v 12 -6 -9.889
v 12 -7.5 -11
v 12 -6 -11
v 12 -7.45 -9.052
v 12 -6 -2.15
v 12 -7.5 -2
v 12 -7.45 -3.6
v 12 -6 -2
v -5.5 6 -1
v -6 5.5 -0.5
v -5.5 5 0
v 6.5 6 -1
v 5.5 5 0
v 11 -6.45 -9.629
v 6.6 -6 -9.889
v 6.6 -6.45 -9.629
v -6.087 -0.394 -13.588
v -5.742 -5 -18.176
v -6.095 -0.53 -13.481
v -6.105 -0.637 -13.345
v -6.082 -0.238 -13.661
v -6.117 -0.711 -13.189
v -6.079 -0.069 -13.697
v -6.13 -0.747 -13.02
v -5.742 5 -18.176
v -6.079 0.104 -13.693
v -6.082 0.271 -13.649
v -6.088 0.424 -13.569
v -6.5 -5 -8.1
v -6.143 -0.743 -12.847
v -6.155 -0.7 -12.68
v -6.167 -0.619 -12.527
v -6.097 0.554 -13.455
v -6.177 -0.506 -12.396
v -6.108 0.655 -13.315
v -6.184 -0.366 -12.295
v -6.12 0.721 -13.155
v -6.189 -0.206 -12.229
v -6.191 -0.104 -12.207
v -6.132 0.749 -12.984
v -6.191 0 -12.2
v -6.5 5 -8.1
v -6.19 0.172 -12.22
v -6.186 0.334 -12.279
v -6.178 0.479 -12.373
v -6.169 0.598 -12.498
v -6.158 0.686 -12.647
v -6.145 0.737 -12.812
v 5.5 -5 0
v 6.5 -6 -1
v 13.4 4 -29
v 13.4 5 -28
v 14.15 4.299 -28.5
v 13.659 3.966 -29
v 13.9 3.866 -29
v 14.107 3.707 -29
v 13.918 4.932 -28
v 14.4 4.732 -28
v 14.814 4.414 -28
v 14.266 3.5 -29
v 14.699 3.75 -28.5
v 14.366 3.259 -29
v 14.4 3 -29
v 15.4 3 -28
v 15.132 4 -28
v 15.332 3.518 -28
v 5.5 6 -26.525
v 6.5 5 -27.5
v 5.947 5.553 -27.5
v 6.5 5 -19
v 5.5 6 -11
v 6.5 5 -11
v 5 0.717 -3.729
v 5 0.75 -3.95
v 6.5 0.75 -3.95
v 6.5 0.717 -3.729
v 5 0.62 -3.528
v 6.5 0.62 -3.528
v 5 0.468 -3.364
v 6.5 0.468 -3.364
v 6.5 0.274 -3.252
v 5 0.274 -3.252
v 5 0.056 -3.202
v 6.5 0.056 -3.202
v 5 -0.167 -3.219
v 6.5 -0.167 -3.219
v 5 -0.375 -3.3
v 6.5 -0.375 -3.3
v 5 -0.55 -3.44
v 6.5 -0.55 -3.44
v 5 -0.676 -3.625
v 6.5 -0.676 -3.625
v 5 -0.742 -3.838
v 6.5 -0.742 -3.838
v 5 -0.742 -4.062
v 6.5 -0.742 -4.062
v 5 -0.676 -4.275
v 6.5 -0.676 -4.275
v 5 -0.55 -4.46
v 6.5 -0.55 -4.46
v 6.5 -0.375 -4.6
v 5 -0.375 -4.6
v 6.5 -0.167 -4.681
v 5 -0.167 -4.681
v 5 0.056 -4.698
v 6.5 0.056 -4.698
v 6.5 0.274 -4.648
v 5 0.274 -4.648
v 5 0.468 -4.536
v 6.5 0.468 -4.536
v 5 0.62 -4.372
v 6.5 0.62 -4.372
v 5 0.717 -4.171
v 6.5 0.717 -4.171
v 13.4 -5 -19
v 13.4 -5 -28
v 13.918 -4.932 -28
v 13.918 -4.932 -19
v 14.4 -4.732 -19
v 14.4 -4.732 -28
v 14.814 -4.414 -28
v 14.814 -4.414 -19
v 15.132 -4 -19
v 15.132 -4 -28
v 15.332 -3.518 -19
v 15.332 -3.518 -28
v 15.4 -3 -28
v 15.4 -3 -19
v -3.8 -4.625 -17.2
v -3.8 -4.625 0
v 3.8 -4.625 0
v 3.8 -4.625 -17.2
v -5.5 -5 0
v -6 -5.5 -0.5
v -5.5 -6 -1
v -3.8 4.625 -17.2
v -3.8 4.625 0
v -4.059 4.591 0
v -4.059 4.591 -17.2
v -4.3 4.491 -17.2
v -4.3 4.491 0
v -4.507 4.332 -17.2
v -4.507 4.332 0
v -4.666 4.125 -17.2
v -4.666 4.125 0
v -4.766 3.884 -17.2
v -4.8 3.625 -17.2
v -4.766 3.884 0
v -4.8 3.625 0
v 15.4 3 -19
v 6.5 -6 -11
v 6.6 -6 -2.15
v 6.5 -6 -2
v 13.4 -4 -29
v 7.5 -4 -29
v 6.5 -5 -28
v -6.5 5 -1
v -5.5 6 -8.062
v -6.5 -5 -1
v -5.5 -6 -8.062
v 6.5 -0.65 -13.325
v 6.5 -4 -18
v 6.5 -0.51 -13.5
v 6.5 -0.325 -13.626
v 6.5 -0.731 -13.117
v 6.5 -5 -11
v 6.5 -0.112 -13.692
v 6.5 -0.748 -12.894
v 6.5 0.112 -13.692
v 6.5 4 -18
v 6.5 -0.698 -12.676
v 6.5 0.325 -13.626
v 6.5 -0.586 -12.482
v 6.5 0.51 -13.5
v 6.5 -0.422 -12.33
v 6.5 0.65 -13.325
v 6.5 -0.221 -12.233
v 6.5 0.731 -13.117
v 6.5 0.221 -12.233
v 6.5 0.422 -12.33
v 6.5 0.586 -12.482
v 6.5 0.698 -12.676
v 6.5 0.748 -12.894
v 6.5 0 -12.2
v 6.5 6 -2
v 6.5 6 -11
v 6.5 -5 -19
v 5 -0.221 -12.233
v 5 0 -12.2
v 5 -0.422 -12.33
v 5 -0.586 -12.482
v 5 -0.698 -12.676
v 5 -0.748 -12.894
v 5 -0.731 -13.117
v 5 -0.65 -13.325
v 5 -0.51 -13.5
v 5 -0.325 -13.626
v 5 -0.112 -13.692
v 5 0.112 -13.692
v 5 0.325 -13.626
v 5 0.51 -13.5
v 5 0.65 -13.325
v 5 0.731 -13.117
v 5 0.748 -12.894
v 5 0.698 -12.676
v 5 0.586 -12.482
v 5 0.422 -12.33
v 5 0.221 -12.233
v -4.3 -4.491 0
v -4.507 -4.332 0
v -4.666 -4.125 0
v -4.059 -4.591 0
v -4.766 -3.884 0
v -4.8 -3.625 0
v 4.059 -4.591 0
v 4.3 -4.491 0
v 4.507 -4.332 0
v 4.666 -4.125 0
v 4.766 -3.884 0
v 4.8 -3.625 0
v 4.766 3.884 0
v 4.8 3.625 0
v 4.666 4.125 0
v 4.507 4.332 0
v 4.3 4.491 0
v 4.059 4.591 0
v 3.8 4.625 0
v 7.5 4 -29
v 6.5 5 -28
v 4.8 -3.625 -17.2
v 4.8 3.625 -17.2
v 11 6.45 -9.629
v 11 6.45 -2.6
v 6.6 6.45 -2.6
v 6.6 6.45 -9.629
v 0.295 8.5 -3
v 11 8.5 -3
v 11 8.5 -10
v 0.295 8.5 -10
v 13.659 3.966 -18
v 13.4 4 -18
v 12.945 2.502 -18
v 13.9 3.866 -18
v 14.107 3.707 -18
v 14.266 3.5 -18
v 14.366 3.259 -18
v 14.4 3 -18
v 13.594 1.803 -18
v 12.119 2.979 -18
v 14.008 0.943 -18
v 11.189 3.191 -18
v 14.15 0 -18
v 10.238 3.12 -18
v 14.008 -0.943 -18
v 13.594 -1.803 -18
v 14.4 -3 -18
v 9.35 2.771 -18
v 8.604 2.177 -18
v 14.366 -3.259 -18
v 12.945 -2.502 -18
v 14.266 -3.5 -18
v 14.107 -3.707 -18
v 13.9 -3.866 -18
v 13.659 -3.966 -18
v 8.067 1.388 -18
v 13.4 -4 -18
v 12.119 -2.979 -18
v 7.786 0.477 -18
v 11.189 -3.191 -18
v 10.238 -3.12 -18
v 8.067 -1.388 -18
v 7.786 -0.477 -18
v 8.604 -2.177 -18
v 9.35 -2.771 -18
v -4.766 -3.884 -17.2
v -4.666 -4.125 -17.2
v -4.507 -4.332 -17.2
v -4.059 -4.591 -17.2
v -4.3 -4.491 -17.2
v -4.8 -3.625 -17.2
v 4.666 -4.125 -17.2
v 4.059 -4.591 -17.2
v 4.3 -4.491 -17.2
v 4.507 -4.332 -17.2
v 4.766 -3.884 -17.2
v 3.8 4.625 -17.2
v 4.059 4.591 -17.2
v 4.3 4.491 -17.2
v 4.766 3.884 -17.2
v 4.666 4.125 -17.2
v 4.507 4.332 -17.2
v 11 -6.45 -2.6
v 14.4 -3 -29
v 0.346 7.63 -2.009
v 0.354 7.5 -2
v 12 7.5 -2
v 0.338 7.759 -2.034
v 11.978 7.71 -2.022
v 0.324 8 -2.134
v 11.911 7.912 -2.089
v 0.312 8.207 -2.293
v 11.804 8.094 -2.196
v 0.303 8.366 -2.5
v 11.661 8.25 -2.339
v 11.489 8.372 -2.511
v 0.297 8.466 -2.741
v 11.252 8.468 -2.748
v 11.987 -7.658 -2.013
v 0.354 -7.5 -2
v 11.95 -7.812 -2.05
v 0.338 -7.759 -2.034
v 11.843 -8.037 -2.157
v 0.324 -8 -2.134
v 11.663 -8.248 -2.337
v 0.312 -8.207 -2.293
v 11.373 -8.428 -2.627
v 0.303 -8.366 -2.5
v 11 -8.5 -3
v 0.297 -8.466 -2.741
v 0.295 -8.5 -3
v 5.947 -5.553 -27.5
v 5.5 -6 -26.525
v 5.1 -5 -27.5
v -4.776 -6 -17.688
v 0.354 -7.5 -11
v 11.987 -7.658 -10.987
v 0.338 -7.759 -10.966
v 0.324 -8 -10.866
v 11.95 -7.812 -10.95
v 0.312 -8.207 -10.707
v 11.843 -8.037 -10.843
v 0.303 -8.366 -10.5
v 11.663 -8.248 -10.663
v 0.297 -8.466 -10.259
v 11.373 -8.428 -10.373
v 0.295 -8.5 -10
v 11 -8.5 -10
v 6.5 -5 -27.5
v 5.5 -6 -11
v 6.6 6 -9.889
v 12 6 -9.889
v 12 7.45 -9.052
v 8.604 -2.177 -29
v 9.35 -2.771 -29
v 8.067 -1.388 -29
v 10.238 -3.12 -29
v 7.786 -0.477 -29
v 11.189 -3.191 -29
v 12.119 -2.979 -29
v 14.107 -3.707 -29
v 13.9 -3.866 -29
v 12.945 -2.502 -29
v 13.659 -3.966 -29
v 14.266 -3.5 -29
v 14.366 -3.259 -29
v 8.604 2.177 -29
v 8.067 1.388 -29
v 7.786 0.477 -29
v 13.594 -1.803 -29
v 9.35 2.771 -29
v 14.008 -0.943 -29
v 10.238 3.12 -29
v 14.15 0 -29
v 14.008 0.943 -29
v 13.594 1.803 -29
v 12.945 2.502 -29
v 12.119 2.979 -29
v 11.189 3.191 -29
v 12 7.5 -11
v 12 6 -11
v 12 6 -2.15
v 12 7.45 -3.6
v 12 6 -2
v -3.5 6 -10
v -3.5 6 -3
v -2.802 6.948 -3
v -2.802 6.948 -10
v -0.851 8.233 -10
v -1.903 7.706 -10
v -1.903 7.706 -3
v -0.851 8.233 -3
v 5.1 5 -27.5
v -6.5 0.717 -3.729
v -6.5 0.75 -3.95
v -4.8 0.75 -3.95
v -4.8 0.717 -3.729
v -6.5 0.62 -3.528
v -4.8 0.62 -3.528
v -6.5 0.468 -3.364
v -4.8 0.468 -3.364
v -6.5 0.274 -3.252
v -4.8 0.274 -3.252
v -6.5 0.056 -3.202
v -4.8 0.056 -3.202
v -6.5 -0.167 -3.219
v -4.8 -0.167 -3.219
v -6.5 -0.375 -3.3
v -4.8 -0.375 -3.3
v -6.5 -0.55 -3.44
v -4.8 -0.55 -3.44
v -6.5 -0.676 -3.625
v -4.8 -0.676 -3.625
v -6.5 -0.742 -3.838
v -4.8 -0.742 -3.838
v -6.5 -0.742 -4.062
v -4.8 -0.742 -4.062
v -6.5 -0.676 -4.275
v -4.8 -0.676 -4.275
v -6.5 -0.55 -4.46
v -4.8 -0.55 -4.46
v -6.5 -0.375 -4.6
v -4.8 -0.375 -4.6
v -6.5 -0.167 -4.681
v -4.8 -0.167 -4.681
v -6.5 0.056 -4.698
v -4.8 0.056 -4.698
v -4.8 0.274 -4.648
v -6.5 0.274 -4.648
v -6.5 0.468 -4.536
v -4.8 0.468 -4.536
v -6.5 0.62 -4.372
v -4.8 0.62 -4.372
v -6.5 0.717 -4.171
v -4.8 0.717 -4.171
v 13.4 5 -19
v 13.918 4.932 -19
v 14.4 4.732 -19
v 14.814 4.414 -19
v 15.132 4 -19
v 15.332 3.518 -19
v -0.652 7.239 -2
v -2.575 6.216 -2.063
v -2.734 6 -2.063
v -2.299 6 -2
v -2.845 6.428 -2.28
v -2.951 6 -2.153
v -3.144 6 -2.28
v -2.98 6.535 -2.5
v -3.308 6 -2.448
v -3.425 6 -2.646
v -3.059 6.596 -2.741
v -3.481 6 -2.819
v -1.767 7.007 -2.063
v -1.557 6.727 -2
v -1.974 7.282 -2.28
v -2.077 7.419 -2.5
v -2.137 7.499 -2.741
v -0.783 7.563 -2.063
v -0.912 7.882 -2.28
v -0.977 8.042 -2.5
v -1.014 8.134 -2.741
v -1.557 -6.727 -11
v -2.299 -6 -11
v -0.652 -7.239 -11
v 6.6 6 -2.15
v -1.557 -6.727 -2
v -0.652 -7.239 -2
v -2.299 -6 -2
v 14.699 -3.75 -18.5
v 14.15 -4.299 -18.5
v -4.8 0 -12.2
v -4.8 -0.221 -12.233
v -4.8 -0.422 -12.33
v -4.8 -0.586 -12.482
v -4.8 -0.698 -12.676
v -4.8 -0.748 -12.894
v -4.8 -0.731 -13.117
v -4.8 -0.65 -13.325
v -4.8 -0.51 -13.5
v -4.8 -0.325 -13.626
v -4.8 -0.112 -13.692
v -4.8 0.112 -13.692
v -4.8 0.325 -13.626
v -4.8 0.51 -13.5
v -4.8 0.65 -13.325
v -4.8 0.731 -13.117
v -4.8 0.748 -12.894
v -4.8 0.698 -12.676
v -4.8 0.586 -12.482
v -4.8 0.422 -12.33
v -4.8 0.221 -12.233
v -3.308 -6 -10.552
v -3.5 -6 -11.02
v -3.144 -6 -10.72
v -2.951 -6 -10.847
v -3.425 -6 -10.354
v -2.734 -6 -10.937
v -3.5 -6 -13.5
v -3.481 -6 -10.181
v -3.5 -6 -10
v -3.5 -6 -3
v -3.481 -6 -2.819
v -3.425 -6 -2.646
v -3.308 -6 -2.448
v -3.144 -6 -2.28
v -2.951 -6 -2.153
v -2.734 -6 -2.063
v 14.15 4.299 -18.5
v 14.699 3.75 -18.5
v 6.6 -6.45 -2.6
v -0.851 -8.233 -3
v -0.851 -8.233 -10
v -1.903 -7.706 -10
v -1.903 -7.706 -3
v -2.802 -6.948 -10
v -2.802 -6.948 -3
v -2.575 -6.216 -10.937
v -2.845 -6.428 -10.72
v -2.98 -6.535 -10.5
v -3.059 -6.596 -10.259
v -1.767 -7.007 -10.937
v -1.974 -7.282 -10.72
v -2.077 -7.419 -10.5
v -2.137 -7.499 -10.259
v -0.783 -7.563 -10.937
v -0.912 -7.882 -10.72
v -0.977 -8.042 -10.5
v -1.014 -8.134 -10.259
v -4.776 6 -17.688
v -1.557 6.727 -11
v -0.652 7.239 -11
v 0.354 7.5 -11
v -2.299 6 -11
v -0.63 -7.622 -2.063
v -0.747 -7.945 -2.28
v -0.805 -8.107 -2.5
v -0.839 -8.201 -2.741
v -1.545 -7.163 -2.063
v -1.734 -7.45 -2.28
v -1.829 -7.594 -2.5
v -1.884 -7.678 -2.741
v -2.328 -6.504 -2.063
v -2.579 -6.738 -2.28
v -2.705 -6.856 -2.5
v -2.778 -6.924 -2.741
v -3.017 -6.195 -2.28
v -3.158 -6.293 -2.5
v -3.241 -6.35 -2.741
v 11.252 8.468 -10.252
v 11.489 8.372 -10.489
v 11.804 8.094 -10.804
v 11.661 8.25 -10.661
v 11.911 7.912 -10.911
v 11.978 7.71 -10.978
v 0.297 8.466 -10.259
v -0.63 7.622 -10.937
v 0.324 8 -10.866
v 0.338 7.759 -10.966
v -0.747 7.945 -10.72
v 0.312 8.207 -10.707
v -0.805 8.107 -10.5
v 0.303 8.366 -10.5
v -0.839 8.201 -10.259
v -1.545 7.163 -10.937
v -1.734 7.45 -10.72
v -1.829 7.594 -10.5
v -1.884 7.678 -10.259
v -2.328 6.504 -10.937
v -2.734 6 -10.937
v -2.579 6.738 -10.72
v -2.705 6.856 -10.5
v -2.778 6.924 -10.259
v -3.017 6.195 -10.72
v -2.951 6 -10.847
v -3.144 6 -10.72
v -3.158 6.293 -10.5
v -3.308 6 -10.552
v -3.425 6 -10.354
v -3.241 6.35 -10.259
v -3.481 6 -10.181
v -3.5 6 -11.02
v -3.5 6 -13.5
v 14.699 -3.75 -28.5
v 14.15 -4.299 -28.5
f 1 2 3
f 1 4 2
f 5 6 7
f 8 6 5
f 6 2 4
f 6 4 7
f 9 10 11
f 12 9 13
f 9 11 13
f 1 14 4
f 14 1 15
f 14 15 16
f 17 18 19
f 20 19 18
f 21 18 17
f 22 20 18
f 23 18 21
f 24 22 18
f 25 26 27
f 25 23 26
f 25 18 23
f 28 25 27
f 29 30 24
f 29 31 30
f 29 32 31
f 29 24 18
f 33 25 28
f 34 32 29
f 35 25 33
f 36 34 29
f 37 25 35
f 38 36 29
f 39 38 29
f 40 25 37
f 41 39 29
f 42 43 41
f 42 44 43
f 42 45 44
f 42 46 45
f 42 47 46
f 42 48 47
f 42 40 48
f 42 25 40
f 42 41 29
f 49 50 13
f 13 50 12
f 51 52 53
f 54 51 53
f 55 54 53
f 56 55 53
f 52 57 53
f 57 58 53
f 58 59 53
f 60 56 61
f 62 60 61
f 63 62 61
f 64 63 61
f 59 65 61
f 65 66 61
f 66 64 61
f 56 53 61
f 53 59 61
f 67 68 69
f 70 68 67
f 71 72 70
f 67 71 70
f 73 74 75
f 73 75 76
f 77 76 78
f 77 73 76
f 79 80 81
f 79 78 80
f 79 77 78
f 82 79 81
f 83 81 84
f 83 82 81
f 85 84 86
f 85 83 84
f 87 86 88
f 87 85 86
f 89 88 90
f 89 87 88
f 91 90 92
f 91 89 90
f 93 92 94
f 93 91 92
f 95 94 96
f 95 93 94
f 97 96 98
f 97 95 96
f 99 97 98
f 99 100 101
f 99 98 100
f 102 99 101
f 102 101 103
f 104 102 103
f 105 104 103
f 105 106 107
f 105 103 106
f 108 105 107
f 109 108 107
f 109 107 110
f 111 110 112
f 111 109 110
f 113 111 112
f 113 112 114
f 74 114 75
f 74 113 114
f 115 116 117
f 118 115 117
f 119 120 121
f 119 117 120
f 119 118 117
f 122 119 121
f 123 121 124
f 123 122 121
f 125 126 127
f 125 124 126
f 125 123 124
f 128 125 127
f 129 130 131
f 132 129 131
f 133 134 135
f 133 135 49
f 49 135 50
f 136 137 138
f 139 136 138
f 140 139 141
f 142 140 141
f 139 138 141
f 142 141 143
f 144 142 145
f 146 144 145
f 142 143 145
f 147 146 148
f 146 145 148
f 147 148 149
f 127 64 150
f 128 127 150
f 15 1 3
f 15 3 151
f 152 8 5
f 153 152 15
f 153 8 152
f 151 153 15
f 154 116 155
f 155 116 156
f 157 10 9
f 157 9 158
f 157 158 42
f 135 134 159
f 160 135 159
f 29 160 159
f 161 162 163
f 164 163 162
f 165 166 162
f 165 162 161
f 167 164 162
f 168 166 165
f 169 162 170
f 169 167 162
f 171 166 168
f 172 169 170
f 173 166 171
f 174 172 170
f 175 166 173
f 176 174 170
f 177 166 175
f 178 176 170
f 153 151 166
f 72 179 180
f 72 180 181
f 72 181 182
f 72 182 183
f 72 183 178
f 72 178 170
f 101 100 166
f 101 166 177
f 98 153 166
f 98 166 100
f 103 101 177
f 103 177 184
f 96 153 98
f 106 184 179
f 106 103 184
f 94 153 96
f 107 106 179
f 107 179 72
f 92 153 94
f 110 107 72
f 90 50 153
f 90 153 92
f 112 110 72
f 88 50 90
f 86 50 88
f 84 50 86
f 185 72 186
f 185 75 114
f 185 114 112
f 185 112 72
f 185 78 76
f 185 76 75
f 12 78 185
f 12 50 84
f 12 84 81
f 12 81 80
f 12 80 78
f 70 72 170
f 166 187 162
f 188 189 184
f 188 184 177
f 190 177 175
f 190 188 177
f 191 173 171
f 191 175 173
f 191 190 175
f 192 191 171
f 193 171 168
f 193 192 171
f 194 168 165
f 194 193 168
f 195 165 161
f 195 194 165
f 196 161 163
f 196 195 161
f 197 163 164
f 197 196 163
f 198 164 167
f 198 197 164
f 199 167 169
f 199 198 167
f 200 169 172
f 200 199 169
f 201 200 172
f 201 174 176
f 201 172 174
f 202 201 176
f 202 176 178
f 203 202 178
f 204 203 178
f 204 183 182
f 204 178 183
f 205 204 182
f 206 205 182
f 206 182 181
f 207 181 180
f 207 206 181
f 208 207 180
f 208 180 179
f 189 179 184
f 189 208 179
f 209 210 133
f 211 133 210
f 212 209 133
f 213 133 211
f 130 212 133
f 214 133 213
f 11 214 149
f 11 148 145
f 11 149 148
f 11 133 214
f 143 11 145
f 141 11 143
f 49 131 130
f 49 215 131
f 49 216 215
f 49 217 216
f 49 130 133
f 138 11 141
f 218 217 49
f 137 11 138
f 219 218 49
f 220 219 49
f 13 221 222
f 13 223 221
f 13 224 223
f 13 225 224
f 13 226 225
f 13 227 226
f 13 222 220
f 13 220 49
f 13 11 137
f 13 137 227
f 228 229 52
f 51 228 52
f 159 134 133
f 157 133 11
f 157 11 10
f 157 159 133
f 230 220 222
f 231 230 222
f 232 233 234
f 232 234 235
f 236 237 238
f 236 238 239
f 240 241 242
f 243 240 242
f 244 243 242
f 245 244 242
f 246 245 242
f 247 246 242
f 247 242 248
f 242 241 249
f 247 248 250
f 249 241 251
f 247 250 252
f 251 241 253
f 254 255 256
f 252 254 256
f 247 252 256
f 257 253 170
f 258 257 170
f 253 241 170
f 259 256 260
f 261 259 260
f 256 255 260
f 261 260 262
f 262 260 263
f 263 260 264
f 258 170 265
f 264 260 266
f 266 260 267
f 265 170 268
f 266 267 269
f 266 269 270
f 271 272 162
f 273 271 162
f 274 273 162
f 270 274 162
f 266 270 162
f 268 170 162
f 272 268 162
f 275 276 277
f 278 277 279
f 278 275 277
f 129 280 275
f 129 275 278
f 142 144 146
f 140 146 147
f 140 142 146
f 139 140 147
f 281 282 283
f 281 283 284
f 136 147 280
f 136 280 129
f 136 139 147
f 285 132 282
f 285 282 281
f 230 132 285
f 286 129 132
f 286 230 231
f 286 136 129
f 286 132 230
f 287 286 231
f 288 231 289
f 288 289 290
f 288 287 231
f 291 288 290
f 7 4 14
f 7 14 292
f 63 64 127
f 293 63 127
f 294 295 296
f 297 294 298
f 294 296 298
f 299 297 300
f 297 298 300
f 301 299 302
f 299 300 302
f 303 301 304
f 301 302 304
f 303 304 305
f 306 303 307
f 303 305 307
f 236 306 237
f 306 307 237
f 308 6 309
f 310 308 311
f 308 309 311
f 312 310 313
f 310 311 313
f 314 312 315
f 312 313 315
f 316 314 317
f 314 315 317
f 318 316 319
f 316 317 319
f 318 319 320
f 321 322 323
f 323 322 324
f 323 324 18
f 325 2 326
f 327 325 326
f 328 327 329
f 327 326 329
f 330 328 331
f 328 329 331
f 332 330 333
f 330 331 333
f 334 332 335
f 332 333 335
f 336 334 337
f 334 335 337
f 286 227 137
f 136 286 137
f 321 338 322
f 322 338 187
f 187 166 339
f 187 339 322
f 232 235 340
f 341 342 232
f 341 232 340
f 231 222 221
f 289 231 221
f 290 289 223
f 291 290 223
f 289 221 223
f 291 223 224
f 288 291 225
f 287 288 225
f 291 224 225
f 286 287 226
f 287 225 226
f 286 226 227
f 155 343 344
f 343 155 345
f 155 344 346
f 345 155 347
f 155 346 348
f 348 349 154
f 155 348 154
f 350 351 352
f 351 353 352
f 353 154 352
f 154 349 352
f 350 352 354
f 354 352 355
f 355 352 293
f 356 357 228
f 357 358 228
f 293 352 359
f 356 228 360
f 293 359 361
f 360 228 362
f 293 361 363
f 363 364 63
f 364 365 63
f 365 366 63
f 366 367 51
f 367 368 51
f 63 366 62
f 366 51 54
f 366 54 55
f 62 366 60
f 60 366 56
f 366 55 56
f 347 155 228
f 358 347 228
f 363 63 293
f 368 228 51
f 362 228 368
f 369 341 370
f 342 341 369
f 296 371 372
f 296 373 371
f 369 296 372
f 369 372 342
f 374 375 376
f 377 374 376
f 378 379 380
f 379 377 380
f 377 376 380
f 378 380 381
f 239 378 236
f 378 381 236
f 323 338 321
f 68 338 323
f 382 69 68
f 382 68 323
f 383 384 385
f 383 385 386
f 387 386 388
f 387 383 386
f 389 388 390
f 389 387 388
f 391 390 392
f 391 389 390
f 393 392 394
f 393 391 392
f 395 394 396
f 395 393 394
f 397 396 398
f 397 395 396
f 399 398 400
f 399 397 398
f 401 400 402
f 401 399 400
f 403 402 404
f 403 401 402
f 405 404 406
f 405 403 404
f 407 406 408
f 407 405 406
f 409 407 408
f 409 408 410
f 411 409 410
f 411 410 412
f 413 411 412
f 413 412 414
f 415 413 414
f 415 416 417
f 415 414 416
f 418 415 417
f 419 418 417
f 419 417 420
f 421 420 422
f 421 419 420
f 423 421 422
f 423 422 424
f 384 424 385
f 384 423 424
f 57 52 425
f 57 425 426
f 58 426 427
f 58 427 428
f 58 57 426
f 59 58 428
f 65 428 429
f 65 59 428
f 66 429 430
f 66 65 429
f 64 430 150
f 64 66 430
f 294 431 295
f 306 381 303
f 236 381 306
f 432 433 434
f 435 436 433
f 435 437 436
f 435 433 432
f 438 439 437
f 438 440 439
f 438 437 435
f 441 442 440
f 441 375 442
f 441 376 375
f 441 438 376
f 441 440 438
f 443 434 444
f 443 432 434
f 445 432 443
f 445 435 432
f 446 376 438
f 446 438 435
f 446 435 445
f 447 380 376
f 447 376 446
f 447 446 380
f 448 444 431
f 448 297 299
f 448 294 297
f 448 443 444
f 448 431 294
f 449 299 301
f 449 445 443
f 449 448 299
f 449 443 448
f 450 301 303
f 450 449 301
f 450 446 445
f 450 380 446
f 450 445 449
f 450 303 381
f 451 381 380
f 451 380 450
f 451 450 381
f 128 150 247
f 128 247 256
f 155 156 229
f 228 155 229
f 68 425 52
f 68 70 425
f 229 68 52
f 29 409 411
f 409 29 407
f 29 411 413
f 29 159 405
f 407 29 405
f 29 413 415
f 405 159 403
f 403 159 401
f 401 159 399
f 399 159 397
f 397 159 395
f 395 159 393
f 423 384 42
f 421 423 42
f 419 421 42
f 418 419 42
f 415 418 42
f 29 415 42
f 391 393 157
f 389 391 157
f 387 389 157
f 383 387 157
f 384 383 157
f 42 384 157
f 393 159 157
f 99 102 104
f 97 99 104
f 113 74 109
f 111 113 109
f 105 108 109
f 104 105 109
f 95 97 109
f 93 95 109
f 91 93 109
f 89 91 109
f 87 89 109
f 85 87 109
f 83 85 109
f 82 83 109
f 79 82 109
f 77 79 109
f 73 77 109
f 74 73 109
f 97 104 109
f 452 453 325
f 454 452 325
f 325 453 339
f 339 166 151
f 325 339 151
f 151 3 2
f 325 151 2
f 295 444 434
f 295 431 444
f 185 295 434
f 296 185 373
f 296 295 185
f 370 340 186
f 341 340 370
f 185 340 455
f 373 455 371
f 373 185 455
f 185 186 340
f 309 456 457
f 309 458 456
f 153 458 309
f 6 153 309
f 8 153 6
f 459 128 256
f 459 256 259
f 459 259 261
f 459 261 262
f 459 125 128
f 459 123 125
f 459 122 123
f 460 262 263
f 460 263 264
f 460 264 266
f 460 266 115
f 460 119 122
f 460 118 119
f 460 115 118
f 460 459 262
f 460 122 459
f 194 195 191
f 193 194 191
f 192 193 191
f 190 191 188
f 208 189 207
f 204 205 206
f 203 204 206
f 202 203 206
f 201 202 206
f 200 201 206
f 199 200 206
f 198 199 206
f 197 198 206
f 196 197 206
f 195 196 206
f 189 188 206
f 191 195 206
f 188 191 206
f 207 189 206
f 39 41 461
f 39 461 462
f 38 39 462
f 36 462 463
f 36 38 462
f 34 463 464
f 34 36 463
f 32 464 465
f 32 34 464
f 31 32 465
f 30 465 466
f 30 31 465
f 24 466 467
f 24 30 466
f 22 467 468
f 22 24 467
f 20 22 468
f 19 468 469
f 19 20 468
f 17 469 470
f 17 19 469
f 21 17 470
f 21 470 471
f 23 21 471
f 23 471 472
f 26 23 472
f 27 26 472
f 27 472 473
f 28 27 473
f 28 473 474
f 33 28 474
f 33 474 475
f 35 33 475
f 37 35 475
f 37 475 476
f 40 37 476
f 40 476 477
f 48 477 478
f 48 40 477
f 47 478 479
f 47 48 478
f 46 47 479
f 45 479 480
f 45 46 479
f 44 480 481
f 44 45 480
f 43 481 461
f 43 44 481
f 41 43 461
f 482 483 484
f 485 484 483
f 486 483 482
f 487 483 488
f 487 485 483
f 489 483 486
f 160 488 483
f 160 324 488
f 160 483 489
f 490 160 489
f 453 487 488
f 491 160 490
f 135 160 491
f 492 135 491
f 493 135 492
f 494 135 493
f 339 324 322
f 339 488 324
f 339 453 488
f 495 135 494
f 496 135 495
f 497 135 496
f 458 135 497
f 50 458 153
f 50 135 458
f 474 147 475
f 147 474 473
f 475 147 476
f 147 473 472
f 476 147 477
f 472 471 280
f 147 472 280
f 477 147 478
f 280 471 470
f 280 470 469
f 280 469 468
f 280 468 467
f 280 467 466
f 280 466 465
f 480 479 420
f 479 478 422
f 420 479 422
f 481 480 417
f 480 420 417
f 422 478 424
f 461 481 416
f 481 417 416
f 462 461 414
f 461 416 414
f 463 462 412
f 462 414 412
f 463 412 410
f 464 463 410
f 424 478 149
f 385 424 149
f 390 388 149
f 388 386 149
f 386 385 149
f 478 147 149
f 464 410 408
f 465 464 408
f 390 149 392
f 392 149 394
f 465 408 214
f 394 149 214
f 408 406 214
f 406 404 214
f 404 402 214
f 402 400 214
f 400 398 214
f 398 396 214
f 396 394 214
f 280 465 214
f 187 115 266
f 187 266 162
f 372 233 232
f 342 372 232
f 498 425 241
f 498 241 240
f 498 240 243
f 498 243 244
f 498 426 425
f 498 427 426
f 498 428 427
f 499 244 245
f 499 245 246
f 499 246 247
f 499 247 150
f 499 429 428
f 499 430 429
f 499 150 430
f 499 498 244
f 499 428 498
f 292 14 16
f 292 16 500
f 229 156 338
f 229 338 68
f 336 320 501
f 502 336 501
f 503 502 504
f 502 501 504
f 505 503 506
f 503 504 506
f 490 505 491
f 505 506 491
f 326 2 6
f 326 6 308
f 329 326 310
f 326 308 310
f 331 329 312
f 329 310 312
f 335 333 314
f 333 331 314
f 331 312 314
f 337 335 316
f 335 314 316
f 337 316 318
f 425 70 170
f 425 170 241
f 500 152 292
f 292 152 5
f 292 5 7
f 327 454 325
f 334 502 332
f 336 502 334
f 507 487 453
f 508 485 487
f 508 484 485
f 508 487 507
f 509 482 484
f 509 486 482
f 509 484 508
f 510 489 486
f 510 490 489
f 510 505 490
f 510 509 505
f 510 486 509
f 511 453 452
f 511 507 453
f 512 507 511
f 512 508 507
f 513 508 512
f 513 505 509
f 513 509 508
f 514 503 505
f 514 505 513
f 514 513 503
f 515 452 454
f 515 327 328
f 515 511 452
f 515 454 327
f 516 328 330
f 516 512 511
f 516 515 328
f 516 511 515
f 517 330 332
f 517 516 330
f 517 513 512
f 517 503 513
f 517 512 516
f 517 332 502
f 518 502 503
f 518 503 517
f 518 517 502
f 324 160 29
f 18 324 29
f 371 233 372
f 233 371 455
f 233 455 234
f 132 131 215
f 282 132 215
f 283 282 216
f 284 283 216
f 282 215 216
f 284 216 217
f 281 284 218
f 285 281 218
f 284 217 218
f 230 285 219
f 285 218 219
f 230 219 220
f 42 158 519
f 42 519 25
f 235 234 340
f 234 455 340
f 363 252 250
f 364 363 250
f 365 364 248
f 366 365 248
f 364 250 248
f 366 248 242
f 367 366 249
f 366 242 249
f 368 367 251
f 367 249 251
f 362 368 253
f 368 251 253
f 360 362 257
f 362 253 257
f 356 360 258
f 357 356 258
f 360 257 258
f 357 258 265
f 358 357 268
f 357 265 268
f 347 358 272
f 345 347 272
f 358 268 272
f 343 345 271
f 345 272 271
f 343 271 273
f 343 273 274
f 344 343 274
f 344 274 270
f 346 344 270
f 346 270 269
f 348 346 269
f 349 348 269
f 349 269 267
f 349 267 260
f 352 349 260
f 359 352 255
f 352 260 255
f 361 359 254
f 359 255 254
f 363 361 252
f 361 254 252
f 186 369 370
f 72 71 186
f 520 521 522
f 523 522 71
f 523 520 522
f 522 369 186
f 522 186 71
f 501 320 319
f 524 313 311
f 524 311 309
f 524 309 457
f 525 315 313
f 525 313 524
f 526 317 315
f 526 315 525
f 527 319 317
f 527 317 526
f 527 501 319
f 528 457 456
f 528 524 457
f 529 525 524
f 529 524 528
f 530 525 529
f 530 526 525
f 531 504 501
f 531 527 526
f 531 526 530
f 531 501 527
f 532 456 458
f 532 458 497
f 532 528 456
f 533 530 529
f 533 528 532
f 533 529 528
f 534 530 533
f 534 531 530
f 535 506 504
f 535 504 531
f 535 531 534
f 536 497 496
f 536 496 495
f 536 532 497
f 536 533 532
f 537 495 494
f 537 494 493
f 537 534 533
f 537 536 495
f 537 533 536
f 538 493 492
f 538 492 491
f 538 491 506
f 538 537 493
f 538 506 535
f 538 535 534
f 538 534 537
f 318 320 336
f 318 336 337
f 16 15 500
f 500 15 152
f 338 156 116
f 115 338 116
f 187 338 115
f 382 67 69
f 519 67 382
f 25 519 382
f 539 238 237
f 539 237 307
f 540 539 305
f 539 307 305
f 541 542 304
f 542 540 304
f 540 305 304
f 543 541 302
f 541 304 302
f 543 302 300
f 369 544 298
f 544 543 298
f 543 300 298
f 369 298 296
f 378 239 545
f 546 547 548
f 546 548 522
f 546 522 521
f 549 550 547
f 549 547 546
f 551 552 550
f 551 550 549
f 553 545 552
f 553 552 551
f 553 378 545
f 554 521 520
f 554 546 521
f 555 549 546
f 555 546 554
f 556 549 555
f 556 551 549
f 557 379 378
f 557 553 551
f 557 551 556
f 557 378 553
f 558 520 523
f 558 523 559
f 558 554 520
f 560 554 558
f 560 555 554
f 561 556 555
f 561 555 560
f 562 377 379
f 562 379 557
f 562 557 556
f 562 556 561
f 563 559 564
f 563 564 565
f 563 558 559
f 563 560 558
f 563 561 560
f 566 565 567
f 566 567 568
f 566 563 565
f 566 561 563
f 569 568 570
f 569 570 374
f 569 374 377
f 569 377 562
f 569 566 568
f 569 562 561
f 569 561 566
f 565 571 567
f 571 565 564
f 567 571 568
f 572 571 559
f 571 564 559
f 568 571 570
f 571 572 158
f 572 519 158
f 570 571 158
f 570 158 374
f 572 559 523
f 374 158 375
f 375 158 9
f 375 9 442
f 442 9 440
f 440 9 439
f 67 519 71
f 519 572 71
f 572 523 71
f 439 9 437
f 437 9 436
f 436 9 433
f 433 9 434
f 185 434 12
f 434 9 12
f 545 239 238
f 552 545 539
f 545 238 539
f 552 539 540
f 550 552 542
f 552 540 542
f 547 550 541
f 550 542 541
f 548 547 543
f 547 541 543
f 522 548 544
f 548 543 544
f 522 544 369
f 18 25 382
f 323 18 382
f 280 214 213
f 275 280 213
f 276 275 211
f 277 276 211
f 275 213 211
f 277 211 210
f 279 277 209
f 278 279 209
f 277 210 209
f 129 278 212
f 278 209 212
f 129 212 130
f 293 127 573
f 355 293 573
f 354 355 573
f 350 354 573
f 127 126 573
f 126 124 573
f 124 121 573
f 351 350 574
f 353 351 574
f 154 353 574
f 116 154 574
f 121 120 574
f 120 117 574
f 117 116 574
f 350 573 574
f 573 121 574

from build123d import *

# Parameters (mm, degrees)
SKETCH2_W                = 13
SKETCH2_H                = 12
BOSS_EXTRUDE3_DEPTH      = 29
CUT_EXTRUDE2_DEPTH       = 17.2
SKETCH5_W                = 15.5
SKETCH5_H                = 2.5
CUT_EXTRUDE3_DEPTH       = 2
CHAMFER4_SIZE            = 1
SKETCH6_W                = 15.5
SKETCH6_H                = 18
CUT_EXTRUDE4_DEPTH       = 2.5
SKETCH8_W                = 15.5
SKETCH8_H                = 18
CUT_EXTRUDE5_DEPTH       = 2.5
BOSS_EXTRUDE4_DEPTH      = 8.9
SKETCH10_R               = 3.2
CUT_EXTRUDE6_DEPTH       = 11
SKETCH11_W               = 13
SKETCH11_H               = 12
CUT_EXTRUDE7_DEPTH       = 1.5
FILLET1_R                = 2
CHAMFER5_SIZE            = 1
CUT_EXTRUDE9_DEPTH       = 36.894428537
CHAMFER6_SIZE            = 1
CHAMFER6_SIZE_2          = 9.42392311
CUT_EXTRUDE11_DEPTH      = 11.5
CHAMFER7_SIZE            = 1
FILLET2_R                = 1
CUT_EXTRUDE12_DEPTH      = 33.897568325
CUT_EXTRUDE12_DEPTH_BACK = 33.897568325
SKETCH17_R               = 0.75
BOSS_EXTRUDE5_START      = -0.2
SKETCH18_R               = 0.795097265
SKETCH18_R_2             = 0.75
BOSS_EXTRUDE5_DEPTH      = 0.2
SKETCH19_W               = 5.4
SKETCH19_H               = 6.7
CUT_EXTRUDE13_DEPTH      = 6.45
CHAMFER8_SIZE            = 0.75
CHAMFER9_SIZE            = 0.288675135
CHAMFER9_SIZE_2          = 0.5
CHAMFER10_SIZE           = 1


with BuildPart() as part:
    # Sketch2 → Boss-Extrude3 (new body)
    with BuildSketch(Plane.XY):
        Polygon((-3.5, 8.5), (-3.5, 6), (6.5, 6), (12, 6), (12, 8.5), align=None)
        Rectangle(SKETCH2_W, SKETCH2_H)
        Polygon((12, -6), (6.5, -6), (-3.5, -6), (-3.5, -8.5), (12, -8.5), align=None)
    extrude(amount=-BOSS_EXTRUDE3_DEPTH)

    # Sketch4 → Cut-Extrude2 (cut)
    with BuildSketch(Plane.XY):
        with BuildLine():
            Line((-3.8, -4.625), (3.8, -4.625))
            ThreePointArc((3.8, -4.625), (4.507106781, -4.332106781), (4.8, -3.625))
            Line((4.8, -3.625), (4.8, 3.625))
            ThreePointArc((4.8, 3.625), (4.507106781, 4.332106781), (3.8, 4.625))
            Line((3.8, 4.625), (-3.8, 4.625))
            ThreePointArc((-3.8, 4.625), (-4.507106781, 4.332106781), (-4.8, 3.625))
            Line((-4.8, 3.625), (-4.8, -3.625))
            ThreePointArc((-4.8, -3.625), (-4.507106781, -4.332106781), (-3.8, -4.625))
        make_face()
    extrude(amount=-CUT_EXTRUDE2_DEPTH, mode=Mode.SUBTRACT)

    # Sketch5 → Cut-Extrude3 (cut)
    with BuildSketch(Plane.XY):
        with Locations((4.25, 7.25)):
            Rectangle(SKETCH5_W, SKETCH5_H)
        with Locations((4.25, -7.25)):
            Rectangle(SKETCH5_W, SKETCH5_H)
    extrude(amount=-CUT_EXTRUDE3_DEPTH, mode=Mode.SUBTRACT)

    # Chamfer4
    chamfer4_edges = [part.edges().sort_by_distance(p)[0] for p in [
        (6.5, 0, 0),
        (0, -6, 0),
        (-6.5, 0, 0),
        (0, 6, 0),
    ]]
    chamfer(chamfer4_edges, length=CHAMFER4_SIZE)

    # Sketch6 → Cut-Extrude4 (cut)
    with BuildSketch(Plane(origin=(0, 8.5, 0), x_dir=(1, 0, 0), z_dir=(0, 1, 0))):
        with Locations((4.25, 20)):
            Rectangle(SKETCH6_W, SKETCH6_H)
    extrude(amount=-CUT_EXTRUDE4_DEPTH, mode=Mode.SUBTRACT)

    # Sketch8 → Cut-Extrude5 (cut)
    with BuildSketch(Plane.XZ.offset(8.5)):
        with Locations((4.25, -20)):
            Rectangle(SKETCH8_W, SKETCH8_H)
    extrude(amount=-CUT_EXTRUDE5_DEPTH, mode=Mode.SUBTRACT)

    # Sketch9 → Boss-Extrude4 (add)
    with BuildSketch(Plane(origin=(6.5, 0, 0), x_dir=(0, 0, -1), z_dir=(1, 0, 0))):
        Polygon((18, 0), (18, 5), (29, 5), (29, -5), (18, -5), align=None)
    extrude(amount=BOSS_EXTRUDE4_DEPTH)

    # Sketch10 → Cut-Extrude6 (cut)
    with BuildSketch(Plane.XY.offset(-18)):
        with Locations((10.95, 0)):
            Circle(SKETCH10_R)
    extrude(amount=-CUT_EXTRUDE6_DEPTH, mode=Mode.SUBTRACT)

    # Sketch11 → Cut-Extrude7 (cut)
    with BuildSketch(Plane(origin=(0, 0, -29), x_dir=(-1, 0, 0), z_dir=(0, 0, -1))):
        Rectangle(SKETCH11_W, SKETCH11_H)
    extrude(amount=-CUT_EXTRUDE7_DEPTH, mode=Mode.SUBTRACT)

    # Fillet1
    fillet1_edges = [part.edges().sort_by_distance(p)[0] for p in [
        (15.4, -5, -23.5),
        (15.4, 5, -23.5),
    ]]
    fillet(fillet1_edges, radius=FILLET1_R)

    # Chamfer5
    chamfer5_edges = [part.edges().sort_by_distance(p)[0] for p in [
        (6.5, 0, -29),
        (15.4, 0, -18),
        (15.4, 0, -29),
        (9.95, -5, -18),
        (9.95, 5, -18),
        (14.814213562, -4.414213562, -18),
        (14.814213562, 4.414213562, -18),
        (9.95, 5, -29),
        (9.95, -5, -29),
        (14.814213562, -4.414213562, -29),
        (14.814213562, 4.414213562, -29),
    ]]
    chamfer(chamfer5_edges, length=CHAMFER5_SIZE)

    # Sketch14 → Cut-Extrude9 (cut, through all)
    with BuildSketch(Plane(origin=(0, 6, 0), x_dir=(1, 0, 0), z_dir=(0, 1, 0))):
        Polygon((-6.5, 27.5), (-6.5, 17.523527678), (5.1, 27.5), align=None)
    extrude(amount=-CUT_EXTRUDE9_DEPTH, mode=Mode.SUBTRACT)

    # Chamfer6
    # the kernel refuses this chamfer: 9.42392311, 1 mm, written as the material it takes off along each edge
    with BuildSketch(Plane(origin=(-6.5, 30.49964556, -17.523527678), x_dir=(0.6076323251889422, 0, -0.794218456966016), z_dir=(0, -1, 0))) as chamfer6_piece_1:
        Polygon((CHAMFER6_SIZE * 0.978564276214, CHAMFER6_SIZE * 0.205941635709), (-CHAMFER6_SIZE_2 * 0.794218456941, CHAMFER6_SIZE_2 * 0.60763232517), (0, 0), align=None)
    extrude(amount=60.999291121, mode=Mode.SUBTRACT)
    # the kernel refuses this chamfer: 9.42392311, 1 mm, written as the material it takes off along each edge
    with BuildSketch(Plane(origin=(-7.691602788, -6, -16.498700761), x_dir=(0.6518104828071479, -0.027495876610586452, 0.757883283409872), z_dir=(0.7581699346405228, 0, -0.6520570145372148))) as chamfer6_2_piece_1:
        Polygon((CHAMFER6_SIZE * 0.999621916911, -CHAMFER6_SIZE * 0.0274958766106), (-CHAMFER6_SIZE * 0.0274958766106, -CHAMFER6_SIZE * 0.999621916911), (0, 0), align=None)
    extrude(amount=19.443365976, mode=Mode.SUBTRACT)
    with BuildSketch(Plane(origin=(-7.691602788, 6, -16.498700761), x_dir=(0.6518104828071478, 0.02749587661058648, 0.757883283409872), z_dir=(0.7581699346405228, 0, -0.6520570145372148))) as chamfer6_2_piece_2:
        Polygon((CHAMFER6_SIZE * 0.999621916911, CHAMFER6_SIZE * 0.0274958766106), (-CHAMFER6_SIZE * 0.0274958766106, CHAMFER6_SIZE * 0.999621916911), (0, 0), align=None)
    extrude(amount=19.443365976, mode=Mode.SUBTRACT)

    # Sketch16 → Cut-Extrude11 (cut)
    with BuildSketch(Plane.XY.offset(-2)):
        with BuildLine():
            ThreePointArc((-3.5, 6), (-1.902802726, 7.706126426), (0.295303565, 8.5))
            Line((0.295303565, 8.5), (-3.5, 8.5))
            Line((-3.5, 8.5), (-3.5, 6))
        make_face()
        with BuildLine():
            Line((-3.5, -8.5), (0.295303565, -8.5))
            ThreePointArc((0.295303565, -8.5), (-1.902802726, -7.706126426), (-3.5, -6))
            Line((-3.5, -6), (-3.5, -8.5))
        make_face()
    extrude(amount=-CUT_EXTRUDE11_DEPTH, mode=Mode.SUBTRACT)

    # Chamfer7
    # the kernel refuses this chamfer: 1 mm, written as the material it takes off along each edge
    with BuildSketch(Plane(origin=(6.5, -6, -11), x_dir=(0.027495876610586487, 0.9996219169112968, 0), z_dir=(0, 0, -1))) as chamfer7_piece_1:
        Polygon((CHAMFER7_SIZE * 0.999621916911, -CHAMFER7_SIZE * 0.0274958766106), (-CHAMFER7_SIZE * 0.0274958766106, -CHAMFER7_SIZE * 0.999621916911), (0, 0), align=None)
    extrude(amount=18.956774475, mode=Mode.SUBTRACT)
    with BuildSketch(Plane(origin=(-6.5, -6, 1.571682988), x_dir=(0.9996219169112968, -0.027495876610586487, 0), z_dir=(0, 0, -1))) as chamfer7_piece_2:
        Polygon((CHAMFER7_SIZE * 0.999621916911, -CHAMFER7_SIZE * 0.0274958766106), (-CHAMFER7_SIZE * 0.0274958766106, -CHAMFER7_SIZE * 0.999621916911), (0, 0), align=None)
    extrude(amount=12.242970544, mode=Mode.SUBTRACT)
    with BuildSketch(Plane(origin=(-5.654981471, -6, -19.329791256), x_dir=(0.9968040214884636, -0.02749587661058647, 0.07500479660556608), z_dir=(-0.0750331653764868, 0, 0.9971810387756)), Plane(origin=(-6.692961515, 6, -5.535171055), x_dir=(0.9968040214884636, 0.027495876610586487, 0.07500479660556608), z_dir=(0.0750331653764868, 0, -0.9971810387756))) as chamfer7_piece_3:
        Polygon((CHAMFER7_SIZE * 0.999621916911, CHAMFER7_SIZE * 0.0274958766106), (-CHAMFER7_SIZE * 0.0274958766106, CHAMFER7_SIZE * 0.999621916911), (0, 0), align=None)
    extrude(amount=13.833616631, mode=Mode.SUBTRACT)
    with BuildSketch(Plane(origin=(6.5, 6, -11), x_dir=(0.027495876610586487, -0.9996219169112968, 0), z_dir=(0, 0, -1))) as chamfer7_piece_4:
        Polygon((CHAMFER7_SIZE * 0.999621916911, CHAMFER7_SIZE * 0.0274958766106), (-CHAMFER7_SIZE * 0.0274958766106, CHAMFER7_SIZE * 0.999621916911), (0, 0), align=None)
    extrude(amount=18.956774475, mode=Mode.SUBTRACT)
    with BuildSketch(Plane(origin=(-6.5, 6, 1.571682988), x_dir=(0.9996219169112968, 0.027495876610586487, 0), z_dir=(0, 0, -1))) as chamfer7_piece_5:
        Polygon((CHAMFER7_SIZE * 0.999621916911, CHAMFER7_SIZE * 0.0274958766106), (-CHAMFER7_SIZE * 0.0274958766106, CHAMFER7_SIZE * 0.999621916911), (0, 0), align=None)
    extrude(amount=12.242970544, mode=Mode.SUBTRACT)

    # Fillet2
    # the kernel refuses this fillet: 1 mm, written as the material it takes off along each edge
    with BuildSketch(Plane(origin=(12, 8.5, -1), x_dir=(-1, 0, 0), z_dir=(0, 0, -1))) as fillet2_piece_1:
        with BuildLine():
            CenterArc((FILLET2_R, -FILLET2_R), FILLET2_R, 90, 90)
            Line((0, -FILLET2_R), (-FILLET2_R * 0.02, -FILLET2_R))
            Line((-FILLET2_R * 0.02, -FILLET2_R), (-FILLET2_R * 0.02, FILLET2_R * 0.02))
            Line((-FILLET2_R * 0.02, FILLET2_R * 0.02), (FILLET2_R, FILLET2_R * 0.02))
            Line((FILLET2_R, FILLET2_R * 0.02), (FILLET2_R, 0))
        make_face()
    extrude(amount=11, mode=Mode.SUBTRACT)
    with BuildSketch(Plane(origin=(12, -8.5, -1), x_dir=(-1, 0, 0), z_dir=(0, 0, -1))) as fillet2_piece_2:
        with BuildLine():
            CenterArc((FILLET2_R, FILLET2_R), FILLET2_R, 180, 90)
            Line((0, FILLET2_R), (-FILLET2_R * 0.02, FILLET2_R))
            Line((-FILLET2_R * 0.02, FILLET2_R), (-FILLET2_R * 0.02, -FILLET2_R * 0.02))
            Line((-FILLET2_R * 0.02, -FILLET2_R * 0.02), (FILLET2_R, -FILLET2_R * 0.02))
            Line((FILLET2_R, -FILLET2_R * 0.02), (FILLET2_R, 0))
        make_face()
    extrude(amount=11, mode=Mode.SUBTRACT)
    with BuildSketch(Plane(origin=(13, -8.5, -11), x_dir=(0, 1, 0), z_dir=(-1, 0, 0))) as fillet2_piece_3:
        with BuildLine():
            CenterArc((FILLET2_R, -FILLET2_R), FILLET2_R, 90, 90)
            Line((0, -FILLET2_R), (-FILLET2_R * 0.02, -FILLET2_R))
            Line((-FILLET2_R * 0.02, -FILLET2_R), (-FILLET2_R * 0.02, FILLET2_R * 0.02))
            Line((-FILLET2_R * 0.02, FILLET2_R * 0.02), (FILLET2_R, FILLET2_R * 0.02))
            Line((FILLET2_R, FILLET2_R * 0.02), (FILLET2_R, 0))
        make_face()
    extrude(amount=13.704696435, mode=Mode.SUBTRACT)
    with BuildSketch(Plane(origin=(0.847651782, -3.530602507, -11), x_dir=(-0.9503253721625865, -0.31125823205827297, 0), z_dir=(-0.31125823205827297, 0.9503253721625865, 0))) as fillet2_piece_4_section:
        with BuildLine():
            CenterArc((5 - FILLET2_R, FILLET2_R), FILLET2_R, 270, 90)
            Line((5, FILLET2_R), (5 + FILLET2_R * 0.02, FILLET2_R))
            Line((5 + FILLET2_R * 0.02, FILLET2_R), (5 + FILLET2_R * 0.02, -FILLET2_R * 0.02))
            Line((5 + FILLET2_R * 0.02, -FILLET2_R * 0.02), (5 - FILLET2_R, -FILLET2_R * 0.02))
            Line((5 - FILLET2_R, -FILLET2_R * 0.02), (5 - FILLET2_R, 0))
        make_face()
    fillet2_piece_4 = revolve(axis=Axis((0.847651782, -3.530602507, -11), (0, 0, 1)), revolution_arc=76.983353639, mode=Mode.PRIVATE)
    fillet2_piece_4 = split(fillet2_piece_4, bisect_by=Plane(origin=(-1.33988421, -6, -10.714938554), z_dir=(0, -1, 0)), keep=Keep.TOP, mode=Mode.PRIVATE)
    add(fillet2_piece_4, mode=Mode.SUBTRACT)
    with BuildSketch(Plane(origin=(13, 8.5, -11), x_dir=(0, -1, 0), z_dir=(-1, 0, 0)), Plane(origin=(-0.704696435, -8.5, -2), x_dir=(0, 0, -1), z_dir=(1, 0, 0)), Plane(origin=(13, 8.5, -2), x_dir=(0, 0, -1), z_dir=(-1, 0, 0))) as fillet2_piece_5:
        with BuildLine():
            CenterArc((FILLET2_R, FILLET2_R), FILLET2_R, 180, 90)
            Line((0, FILLET2_R), (-FILLET2_R * 0.02, FILLET2_R))
            Line((-FILLET2_R * 0.02, FILLET2_R), (-FILLET2_R * 0.02, -FILLET2_R * 0.02))
            Line((-FILLET2_R * 0.02, -FILLET2_R * 0.02), (FILLET2_R, -FILLET2_R * 0.02))
            Line((FILLET2_R, -FILLET2_R * 0.02), (FILLET2_R, 0))
        make_face()
    extrude(amount=13.704696435, mode=Mode.SUBTRACT)
    with BuildSketch(Plane(origin=(0.847651782, 3.530602507, -11), x_dir=(0.08921463778301607, 0.9960124238207299, 0), z_dir=(0.9960124238207299, -0.08921463778301607, 0))) as fillet2_piece_6_section:
        with BuildLine():
            CenterArc((5 - FILLET2_R, FILLET2_R), FILLET2_R, 270, 90)
            Line((5, FILLET2_R), (5 + FILLET2_R * 0.02, FILLET2_R))
            Line((5 + FILLET2_R * 0.02, FILLET2_R), (5 + FILLET2_R * 0.02, -FILLET2_R * 0.02))
            Line((5 + FILLET2_R * 0.02, -FILLET2_R * 0.02), (5 - FILLET2_R, -FILLET2_R * 0.02))
            Line((5 - FILLET2_R, -FILLET2_R * 0.02), (5 - FILLET2_R, 0))
        make_face()
    fillet2_piece_6 = revolve(axis=Axis((0.847651782, 3.530602507, -11), (0, 0, 1)), revolution_arc=76.983353639, mode=Mode.PRIVATE)
    fillet2_piece_6 = split(fillet2_piece_6, bisect_by=Plane(origin=(-1.339884211, 6, -10.714938555), z_dir=(0, 1, 0)), keep=Keep.TOP, mode=Mode.PRIVATE)
    add(fillet2_piece_6, mode=Mode.SUBTRACT)
    with BuildSketch(Plane(origin=(0.847651782, -3.530602507, -2), x_dir=(0.08921463778301987, -0.9960124238207294, 0), z_dir=(0.9960124238207294, 0.08921463778301987, 0))) as fillet2_piece_7_section:
        with BuildLine():
            CenterArc((5 - FILLET2_R, FILLET2_R), FILLET2_R, 270, 90)
            Line((5 - FILLET2_R, 0), (5 - FILLET2_R, -FILLET2_R * 0.02))
            Line((5 - FILLET2_R, -FILLET2_R * 0.02), (5 + FILLET2_R * 0.02, -FILLET2_R * 0.02))
            Line((5 + FILLET2_R * 0.02, -FILLET2_R * 0.02), (5 + FILLET2_R * 0.02, FILLET2_R))
            Line((5 + FILLET2_R * 0.02, FILLET2_R), (5, FILLET2_R))
        make_face()
    fillet2_piece_7 = revolve(axis=Axis((0.847651782, -3.530602507, -2), (0, 0, -1)), revolution_arc=76.983353639, mode=Mode.PRIVATE)
    fillet2_piece_7 = split(fillet2_piece_7, bisect_by=Plane(origin=(-1.33988421, -6, -2.285061446), z_dir=(0, -1, 0)), keep=Keep.TOP, mode=Mode.PRIVATE)
    add(fillet2_piece_7, mode=Mode.SUBTRACT)
    with BuildSketch(Plane(origin=(0.847651782, 3.530602507, -2), x_dir=(-0.9503253721625862, 0.31125823205827374, 0), z_dir=(-0.31125823205827374, -0.9503253721625862, 0))) as fillet2_piece_8_section:
        with BuildLine():
            CenterArc((5 - FILLET2_R, FILLET2_R), FILLET2_R, 270, 90)
            Line((5 - FILLET2_R, 0), (5 - FILLET2_R, -FILLET2_R * 0.02))
            Line((5 - FILLET2_R, -FILLET2_R * 0.02), (5 + FILLET2_R * 0.02, -FILLET2_R * 0.02))
            Line((5 + FILLET2_R * 0.02, -FILLET2_R * 0.02), (5 + FILLET2_R * 0.02, FILLET2_R))
            Line((5 + FILLET2_R * 0.02, FILLET2_R), (5, FILLET2_R))
        make_face()
    fillet2_piece_8 = revolve(axis=Axis((0.847651782, 3.530602507, -2), (0, 0, -1)), revolution_arc=76.983353639, mode=Mode.PRIVATE)
    fillet2_piece_8 = split(fillet2_piece_8, bisect_by=Plane(origin=(-1.33988421, 6, -2.285061446), z_dir=(0, 1, 0)), keep=Keep.TOP, mode=Mode.PRIVATE)
    add(fillet2_piece_8, mode=Mode.SUBTRACT)

    # Sketch17 → Cut-Extrude12 (cut, two sides: drawn at the far end of the back side and taken through both)
    with BuildSketch(Plane(origin=(6.5, 0, 0), x_dir=(0, 0, -1), z_dir=(1, 0, 0)).offset(-CUT_EXTRUDE12_DEPTH_BACK)):
        with Locations(Location((3.95, 0, 0), (0, 0, 90))):
            Circle(SKETCH17_R)
        with Locations(Location((12.95, 0, 0), (0, 0, 180))):
            Circle(SKETCH17_R)
    extrude(amount=CUT_EXTRUDE12_DEPTH + CUT_EXTRUDE12_DEPTH_BACK, mode=Mode.SUBTRACT)

    # Sketch18 → Boss-Extrude5 (add)
    with BuildSketch(Plane.ZY.offset(-4.8).offset(BOSS_EXTRUDE5_START)):
        with Locations((-12.95, 0)):
            Circle(SKETCH18_R)
        with Locations(Location((-3.95, 0, 0), (0, 0, 90))):
            Circle(SKETCH18_R_2)
    extrude(amount=BOSS_EXTRUDE5_DEPTH)

    # Sketch19 → Cut-Extrude13 (cut, symmetric)
    with BuildSketch(Plane(origin=(0, 0, 0), x_dir=(-1, 0, 0), z_dir=(0, -1, 0))):
        with Locations((-9.3, 6.25)):
            Rectangle(SKETCH19_W, SKETCH19_H)
    extrude(amount=CUT_EXTRUDE13_DEPTH, both=True, mode=Mode.SUBTRACT)

    # Chamfer8
    # the kernel refuses this chamfer: 0.75 mm, written as the material it takes off along each edge
    with BuildSketch(Plane(origin=(13.928762241, -6, -2.9), x_dir=(0, 0.02749587661058678, 0.9996219169112968), z_dir=(-1, 0, 0))) as chamfer8_piece_1_section:
        Polygon((CHAMFER8_SIZE * 0.999621916911, -CHAMFER8_SIZE * 0.0274958766106), (-CHAMFER8_SIZE * 0.0274958766106, -CHAMFER8_SIZE * 0.999621916911), (0, 0), align=None)
    chamfer8_piece_1 = extrude(amount=7.328762241, mode=Mode.PRIVATE)
    chamfer8_piece_1 = split(chamfer8_piece_1, bisect_by=Plane(origin=(10.26438112, -6.45, -2.618742905), z_dir=(0, 1, 0)), keep=Keep.TOP, mode=Mode.PRIVATE)
    add(chamfer8_piece_1, mode=Mode.SUBTRACT)
    with BuildSketch(Plane(origin=(6.6, 6, -2.9), x_dir=(0, -0.02749587661058678, 0.9996219169112968), z_dir=(1, 0, 0))) as chamfer8_piece_2_section:
        Polygon((CHAMFER8_SIZE * 0.999621916911, -CHAMFER8_SIZE * 0.0274958766106), (-CHAMFER8_SIZE * 0.0274958766106, -CHAMFER8_SIZE * 0.999621916911), (0, 0), align=None)
    chamfer8_piece_2 = extrude(amount=7.328762241, mode=Mode.PRIVATE)
    chamfer8_piece_2 = split(chamfer8_piece_2, bisect_by=Plane(origin=(10.26438112, 6.45, -2.618742905), z_dir=(0, -1, 0)), keep=Keep.TOP, mode=Mode.PRIVATE)
    add(chamfer8_piece_2, mode=Mode.SUBTRACT)

    # Chamfer9
    # the kernel refuses this chamfer: 0.5, 0.288675135 mm, written as the material it takes off along each edge
    with BuildSketch(Plane(origin=(6.6, -6, -9.6), x_dir=(0, 0.057893862402671276, -0.9983227437537925), z_dir=(1, 0, 0))) as chamfer9_piece_1_section:
        Polygon((CHAMFER9_SIZE * 0.998322742353, -CHAMFER9_SIZE * 0.0578938623214), (-CHAMFER9_SIZE_2 * 0.0578938624027, -CHAMFER9_SIZE_2 * 0.998322743754), (0, 0), align=None)
    chamfer9_piece_1 = extrude(amount=6.693542877, mode=Mode.PRIVATE)
    chamfer9_piece_1 = split(chamfer9_piece_1, bisect_by=Plane(origin=(9.946771439, -6.45, -9.694765745), z_dir=(0, 1, 0)), keep=Keep.TOP, mode=Mode.PRIVATE)
    add(chamfer9_piece_1, mode=Mode.SUBTRACT)
    with BuildSketch(Plane(origin=(13.293542877, 6, -9.6), x_dir=(0, 0.9998132206222079, 0.019326765612700258), z_dir=(-1, 0, 0))) as chamfer9_piece_2_section:
        Polygon((CHAMFER9_SIZE_2 * 0.999813220622, CHAMFER9_SIZE_2 * 0.0193267656127), (-CHAMFER9_SIZE * 0.0193267655856, CHAMFER9_SIZE * 0.999813219219), (0, 0), align=None)
    chamfer9_piece_2 = extrude(amount=6.693542877, mode=Mode.PRIVATE)
    chamfer9_piece_2 = split(chamfer9_piece_2, bisect_by=Plane(origin=(9.946771439, 6.45, -9.694765745), z_dir=(0, -1, 0)), keep=Keep.TOP, mode=Mode.PRIVATE)
    add(chamfer9_piece_2, mode=Mode.SUBTRACT)

    # Chamfer10
    chamfer10_edges = [part.edges().sort_by_distance(p)[0] for p in [
        (12, 6.45, -6.114433757),
        (12, -6.45, -6.114433757),
    ]]
    chamfer(chamfer10_edges, length=CHAMFER10_SIZE)


solid = part.part
